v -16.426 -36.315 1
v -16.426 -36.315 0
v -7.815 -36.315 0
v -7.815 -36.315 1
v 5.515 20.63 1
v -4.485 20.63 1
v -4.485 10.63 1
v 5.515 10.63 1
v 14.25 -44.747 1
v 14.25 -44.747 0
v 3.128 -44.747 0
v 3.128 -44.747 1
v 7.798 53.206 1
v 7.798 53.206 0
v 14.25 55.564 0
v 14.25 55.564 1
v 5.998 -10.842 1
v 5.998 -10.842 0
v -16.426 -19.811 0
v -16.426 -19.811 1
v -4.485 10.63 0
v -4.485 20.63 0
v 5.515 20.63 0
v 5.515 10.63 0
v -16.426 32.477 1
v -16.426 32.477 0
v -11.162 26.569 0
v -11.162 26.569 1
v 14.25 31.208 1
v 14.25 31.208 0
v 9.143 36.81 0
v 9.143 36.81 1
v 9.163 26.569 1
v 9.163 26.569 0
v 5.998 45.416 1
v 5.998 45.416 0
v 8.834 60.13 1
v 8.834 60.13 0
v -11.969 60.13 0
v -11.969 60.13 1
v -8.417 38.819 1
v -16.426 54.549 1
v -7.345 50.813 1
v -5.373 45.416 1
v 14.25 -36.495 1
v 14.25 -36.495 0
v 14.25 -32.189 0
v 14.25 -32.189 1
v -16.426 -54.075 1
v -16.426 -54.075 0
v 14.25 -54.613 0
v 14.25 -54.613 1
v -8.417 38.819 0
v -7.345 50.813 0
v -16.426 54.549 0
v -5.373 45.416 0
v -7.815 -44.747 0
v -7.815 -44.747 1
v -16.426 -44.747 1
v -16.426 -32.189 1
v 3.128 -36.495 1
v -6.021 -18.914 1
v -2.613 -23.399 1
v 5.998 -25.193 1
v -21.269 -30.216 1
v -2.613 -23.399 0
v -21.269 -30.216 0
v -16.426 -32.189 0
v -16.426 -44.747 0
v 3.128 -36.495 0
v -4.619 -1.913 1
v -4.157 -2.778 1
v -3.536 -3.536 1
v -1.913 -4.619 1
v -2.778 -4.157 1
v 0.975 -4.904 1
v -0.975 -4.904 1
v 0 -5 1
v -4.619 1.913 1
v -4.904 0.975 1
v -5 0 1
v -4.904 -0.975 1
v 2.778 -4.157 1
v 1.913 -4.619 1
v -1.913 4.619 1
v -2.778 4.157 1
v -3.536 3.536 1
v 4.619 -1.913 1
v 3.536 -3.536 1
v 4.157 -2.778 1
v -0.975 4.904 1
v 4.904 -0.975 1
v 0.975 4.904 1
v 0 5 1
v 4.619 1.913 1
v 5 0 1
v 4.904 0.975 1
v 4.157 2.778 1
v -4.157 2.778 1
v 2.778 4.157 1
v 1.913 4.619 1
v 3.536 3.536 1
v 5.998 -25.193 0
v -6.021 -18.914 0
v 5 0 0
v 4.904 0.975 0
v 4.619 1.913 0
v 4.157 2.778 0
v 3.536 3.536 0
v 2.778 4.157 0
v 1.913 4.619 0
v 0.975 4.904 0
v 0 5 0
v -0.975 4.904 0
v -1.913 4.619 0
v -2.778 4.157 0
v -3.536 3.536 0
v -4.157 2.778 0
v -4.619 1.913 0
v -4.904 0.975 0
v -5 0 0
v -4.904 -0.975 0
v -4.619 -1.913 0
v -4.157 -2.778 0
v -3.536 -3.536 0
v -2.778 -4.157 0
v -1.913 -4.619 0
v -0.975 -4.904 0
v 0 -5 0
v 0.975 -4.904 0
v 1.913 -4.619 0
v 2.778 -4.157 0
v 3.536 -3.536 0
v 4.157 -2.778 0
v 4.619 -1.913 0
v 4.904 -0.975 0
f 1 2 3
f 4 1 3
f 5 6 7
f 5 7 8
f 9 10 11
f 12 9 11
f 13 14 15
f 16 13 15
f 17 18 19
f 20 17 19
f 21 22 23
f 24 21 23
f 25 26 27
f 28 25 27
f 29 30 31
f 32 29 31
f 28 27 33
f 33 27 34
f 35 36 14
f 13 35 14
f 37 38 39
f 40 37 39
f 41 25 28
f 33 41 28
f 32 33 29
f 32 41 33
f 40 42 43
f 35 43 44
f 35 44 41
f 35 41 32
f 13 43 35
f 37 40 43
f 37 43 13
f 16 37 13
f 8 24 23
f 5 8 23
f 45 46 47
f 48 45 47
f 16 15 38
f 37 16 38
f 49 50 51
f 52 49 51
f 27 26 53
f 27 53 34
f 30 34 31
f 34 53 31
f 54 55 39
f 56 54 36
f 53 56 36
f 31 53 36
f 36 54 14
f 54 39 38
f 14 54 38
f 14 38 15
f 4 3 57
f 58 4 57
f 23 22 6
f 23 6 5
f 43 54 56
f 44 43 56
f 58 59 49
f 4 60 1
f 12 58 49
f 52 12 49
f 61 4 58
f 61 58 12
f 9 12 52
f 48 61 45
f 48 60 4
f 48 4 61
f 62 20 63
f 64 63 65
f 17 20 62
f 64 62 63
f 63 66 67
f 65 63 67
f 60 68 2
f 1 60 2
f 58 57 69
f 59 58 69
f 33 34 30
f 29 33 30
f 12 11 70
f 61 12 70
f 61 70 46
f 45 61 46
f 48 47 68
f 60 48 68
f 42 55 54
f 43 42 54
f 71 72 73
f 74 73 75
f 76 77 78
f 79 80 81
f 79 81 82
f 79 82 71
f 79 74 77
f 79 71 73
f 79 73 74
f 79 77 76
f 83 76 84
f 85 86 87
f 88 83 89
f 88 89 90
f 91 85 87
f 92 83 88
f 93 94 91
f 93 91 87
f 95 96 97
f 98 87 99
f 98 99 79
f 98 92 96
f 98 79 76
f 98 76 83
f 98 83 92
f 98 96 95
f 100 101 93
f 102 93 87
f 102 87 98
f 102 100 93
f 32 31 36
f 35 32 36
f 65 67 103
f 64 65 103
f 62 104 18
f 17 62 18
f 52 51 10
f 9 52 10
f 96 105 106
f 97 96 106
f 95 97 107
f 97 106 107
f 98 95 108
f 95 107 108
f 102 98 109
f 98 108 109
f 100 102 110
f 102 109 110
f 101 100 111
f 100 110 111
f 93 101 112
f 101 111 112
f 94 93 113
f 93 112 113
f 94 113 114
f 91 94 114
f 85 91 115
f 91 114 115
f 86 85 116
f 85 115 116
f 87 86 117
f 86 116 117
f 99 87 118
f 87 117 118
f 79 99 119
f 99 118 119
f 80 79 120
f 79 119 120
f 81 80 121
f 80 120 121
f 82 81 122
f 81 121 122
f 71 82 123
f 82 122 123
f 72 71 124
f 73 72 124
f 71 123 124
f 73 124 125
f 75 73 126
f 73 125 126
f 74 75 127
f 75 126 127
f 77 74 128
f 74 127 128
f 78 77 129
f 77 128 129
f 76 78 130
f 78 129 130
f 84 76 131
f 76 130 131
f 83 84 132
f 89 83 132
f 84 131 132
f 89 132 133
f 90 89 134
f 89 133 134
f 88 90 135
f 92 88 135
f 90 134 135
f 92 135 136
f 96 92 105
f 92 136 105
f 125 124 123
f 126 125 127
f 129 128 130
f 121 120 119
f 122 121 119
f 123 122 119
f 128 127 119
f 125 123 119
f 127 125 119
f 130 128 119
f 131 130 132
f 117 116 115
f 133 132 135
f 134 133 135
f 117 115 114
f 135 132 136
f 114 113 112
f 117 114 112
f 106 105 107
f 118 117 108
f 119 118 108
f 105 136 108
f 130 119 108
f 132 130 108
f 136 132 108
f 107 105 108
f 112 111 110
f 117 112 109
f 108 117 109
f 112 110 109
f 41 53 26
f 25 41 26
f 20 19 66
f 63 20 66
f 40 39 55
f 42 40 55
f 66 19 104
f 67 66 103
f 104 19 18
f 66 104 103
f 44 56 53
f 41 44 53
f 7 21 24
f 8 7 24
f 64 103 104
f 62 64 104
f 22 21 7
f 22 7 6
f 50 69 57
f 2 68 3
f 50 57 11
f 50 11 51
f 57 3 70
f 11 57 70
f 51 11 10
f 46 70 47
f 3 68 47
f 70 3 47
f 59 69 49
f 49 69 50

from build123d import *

# Parameters (mm, degrees)
F0_W     = 10
F0_H     = 10
F0_R     = 5
F1_DEPTH = 1


with BuildPart() as f1:
    # F0 (on Top) → F1 (new body)
    with BuildSketch(Plane.XY):
        with Locations((0.515197, 15.630106)):
            Rectangle(F0_W, F0_H)
        Circle(F0_R)
        Polygon((5.998152, -10.841748), (-16.425883, -19.811362), (-2.612678, -23.399208), (-21.269476, -30.216115), (5.998152, -25.193131), (-6.021129, -18.914402), align=None)
        Polygon((-16.425883, -44.746891), (-16.425883, -54.07529), (14.250197, -54.613467), (14.250197, -44.746891), (3.127878, -44.746891), (3.127878, -36.494844), (14.250197, -36.494844), (14.250197, -32.189429), (-16.425883, -32.189429), (-16.425883, -36.315452), (-7.815054, -36.315452), (-7.815054, -44.746891), align=None)
        Polygon((-8.417216, 38.819421), (-16.425883, 32.476947), (-11.161714, 26.569341), (9.162663, 26.569341), (14.250197, 31.208452), (9.142588, 36.809771), (5.998152, 45.415595), (7.797876, 53.205975), (14.250197, 55.563554), (8.834315, 60.130138), (-11.969001, 60.130138), (-16.425883, 54.548759), (-7.344975, 50.813051), (-5.372827, 45.415595), align=None)
    extrude(amount=F1_DEPTH)


solid = f1.part
